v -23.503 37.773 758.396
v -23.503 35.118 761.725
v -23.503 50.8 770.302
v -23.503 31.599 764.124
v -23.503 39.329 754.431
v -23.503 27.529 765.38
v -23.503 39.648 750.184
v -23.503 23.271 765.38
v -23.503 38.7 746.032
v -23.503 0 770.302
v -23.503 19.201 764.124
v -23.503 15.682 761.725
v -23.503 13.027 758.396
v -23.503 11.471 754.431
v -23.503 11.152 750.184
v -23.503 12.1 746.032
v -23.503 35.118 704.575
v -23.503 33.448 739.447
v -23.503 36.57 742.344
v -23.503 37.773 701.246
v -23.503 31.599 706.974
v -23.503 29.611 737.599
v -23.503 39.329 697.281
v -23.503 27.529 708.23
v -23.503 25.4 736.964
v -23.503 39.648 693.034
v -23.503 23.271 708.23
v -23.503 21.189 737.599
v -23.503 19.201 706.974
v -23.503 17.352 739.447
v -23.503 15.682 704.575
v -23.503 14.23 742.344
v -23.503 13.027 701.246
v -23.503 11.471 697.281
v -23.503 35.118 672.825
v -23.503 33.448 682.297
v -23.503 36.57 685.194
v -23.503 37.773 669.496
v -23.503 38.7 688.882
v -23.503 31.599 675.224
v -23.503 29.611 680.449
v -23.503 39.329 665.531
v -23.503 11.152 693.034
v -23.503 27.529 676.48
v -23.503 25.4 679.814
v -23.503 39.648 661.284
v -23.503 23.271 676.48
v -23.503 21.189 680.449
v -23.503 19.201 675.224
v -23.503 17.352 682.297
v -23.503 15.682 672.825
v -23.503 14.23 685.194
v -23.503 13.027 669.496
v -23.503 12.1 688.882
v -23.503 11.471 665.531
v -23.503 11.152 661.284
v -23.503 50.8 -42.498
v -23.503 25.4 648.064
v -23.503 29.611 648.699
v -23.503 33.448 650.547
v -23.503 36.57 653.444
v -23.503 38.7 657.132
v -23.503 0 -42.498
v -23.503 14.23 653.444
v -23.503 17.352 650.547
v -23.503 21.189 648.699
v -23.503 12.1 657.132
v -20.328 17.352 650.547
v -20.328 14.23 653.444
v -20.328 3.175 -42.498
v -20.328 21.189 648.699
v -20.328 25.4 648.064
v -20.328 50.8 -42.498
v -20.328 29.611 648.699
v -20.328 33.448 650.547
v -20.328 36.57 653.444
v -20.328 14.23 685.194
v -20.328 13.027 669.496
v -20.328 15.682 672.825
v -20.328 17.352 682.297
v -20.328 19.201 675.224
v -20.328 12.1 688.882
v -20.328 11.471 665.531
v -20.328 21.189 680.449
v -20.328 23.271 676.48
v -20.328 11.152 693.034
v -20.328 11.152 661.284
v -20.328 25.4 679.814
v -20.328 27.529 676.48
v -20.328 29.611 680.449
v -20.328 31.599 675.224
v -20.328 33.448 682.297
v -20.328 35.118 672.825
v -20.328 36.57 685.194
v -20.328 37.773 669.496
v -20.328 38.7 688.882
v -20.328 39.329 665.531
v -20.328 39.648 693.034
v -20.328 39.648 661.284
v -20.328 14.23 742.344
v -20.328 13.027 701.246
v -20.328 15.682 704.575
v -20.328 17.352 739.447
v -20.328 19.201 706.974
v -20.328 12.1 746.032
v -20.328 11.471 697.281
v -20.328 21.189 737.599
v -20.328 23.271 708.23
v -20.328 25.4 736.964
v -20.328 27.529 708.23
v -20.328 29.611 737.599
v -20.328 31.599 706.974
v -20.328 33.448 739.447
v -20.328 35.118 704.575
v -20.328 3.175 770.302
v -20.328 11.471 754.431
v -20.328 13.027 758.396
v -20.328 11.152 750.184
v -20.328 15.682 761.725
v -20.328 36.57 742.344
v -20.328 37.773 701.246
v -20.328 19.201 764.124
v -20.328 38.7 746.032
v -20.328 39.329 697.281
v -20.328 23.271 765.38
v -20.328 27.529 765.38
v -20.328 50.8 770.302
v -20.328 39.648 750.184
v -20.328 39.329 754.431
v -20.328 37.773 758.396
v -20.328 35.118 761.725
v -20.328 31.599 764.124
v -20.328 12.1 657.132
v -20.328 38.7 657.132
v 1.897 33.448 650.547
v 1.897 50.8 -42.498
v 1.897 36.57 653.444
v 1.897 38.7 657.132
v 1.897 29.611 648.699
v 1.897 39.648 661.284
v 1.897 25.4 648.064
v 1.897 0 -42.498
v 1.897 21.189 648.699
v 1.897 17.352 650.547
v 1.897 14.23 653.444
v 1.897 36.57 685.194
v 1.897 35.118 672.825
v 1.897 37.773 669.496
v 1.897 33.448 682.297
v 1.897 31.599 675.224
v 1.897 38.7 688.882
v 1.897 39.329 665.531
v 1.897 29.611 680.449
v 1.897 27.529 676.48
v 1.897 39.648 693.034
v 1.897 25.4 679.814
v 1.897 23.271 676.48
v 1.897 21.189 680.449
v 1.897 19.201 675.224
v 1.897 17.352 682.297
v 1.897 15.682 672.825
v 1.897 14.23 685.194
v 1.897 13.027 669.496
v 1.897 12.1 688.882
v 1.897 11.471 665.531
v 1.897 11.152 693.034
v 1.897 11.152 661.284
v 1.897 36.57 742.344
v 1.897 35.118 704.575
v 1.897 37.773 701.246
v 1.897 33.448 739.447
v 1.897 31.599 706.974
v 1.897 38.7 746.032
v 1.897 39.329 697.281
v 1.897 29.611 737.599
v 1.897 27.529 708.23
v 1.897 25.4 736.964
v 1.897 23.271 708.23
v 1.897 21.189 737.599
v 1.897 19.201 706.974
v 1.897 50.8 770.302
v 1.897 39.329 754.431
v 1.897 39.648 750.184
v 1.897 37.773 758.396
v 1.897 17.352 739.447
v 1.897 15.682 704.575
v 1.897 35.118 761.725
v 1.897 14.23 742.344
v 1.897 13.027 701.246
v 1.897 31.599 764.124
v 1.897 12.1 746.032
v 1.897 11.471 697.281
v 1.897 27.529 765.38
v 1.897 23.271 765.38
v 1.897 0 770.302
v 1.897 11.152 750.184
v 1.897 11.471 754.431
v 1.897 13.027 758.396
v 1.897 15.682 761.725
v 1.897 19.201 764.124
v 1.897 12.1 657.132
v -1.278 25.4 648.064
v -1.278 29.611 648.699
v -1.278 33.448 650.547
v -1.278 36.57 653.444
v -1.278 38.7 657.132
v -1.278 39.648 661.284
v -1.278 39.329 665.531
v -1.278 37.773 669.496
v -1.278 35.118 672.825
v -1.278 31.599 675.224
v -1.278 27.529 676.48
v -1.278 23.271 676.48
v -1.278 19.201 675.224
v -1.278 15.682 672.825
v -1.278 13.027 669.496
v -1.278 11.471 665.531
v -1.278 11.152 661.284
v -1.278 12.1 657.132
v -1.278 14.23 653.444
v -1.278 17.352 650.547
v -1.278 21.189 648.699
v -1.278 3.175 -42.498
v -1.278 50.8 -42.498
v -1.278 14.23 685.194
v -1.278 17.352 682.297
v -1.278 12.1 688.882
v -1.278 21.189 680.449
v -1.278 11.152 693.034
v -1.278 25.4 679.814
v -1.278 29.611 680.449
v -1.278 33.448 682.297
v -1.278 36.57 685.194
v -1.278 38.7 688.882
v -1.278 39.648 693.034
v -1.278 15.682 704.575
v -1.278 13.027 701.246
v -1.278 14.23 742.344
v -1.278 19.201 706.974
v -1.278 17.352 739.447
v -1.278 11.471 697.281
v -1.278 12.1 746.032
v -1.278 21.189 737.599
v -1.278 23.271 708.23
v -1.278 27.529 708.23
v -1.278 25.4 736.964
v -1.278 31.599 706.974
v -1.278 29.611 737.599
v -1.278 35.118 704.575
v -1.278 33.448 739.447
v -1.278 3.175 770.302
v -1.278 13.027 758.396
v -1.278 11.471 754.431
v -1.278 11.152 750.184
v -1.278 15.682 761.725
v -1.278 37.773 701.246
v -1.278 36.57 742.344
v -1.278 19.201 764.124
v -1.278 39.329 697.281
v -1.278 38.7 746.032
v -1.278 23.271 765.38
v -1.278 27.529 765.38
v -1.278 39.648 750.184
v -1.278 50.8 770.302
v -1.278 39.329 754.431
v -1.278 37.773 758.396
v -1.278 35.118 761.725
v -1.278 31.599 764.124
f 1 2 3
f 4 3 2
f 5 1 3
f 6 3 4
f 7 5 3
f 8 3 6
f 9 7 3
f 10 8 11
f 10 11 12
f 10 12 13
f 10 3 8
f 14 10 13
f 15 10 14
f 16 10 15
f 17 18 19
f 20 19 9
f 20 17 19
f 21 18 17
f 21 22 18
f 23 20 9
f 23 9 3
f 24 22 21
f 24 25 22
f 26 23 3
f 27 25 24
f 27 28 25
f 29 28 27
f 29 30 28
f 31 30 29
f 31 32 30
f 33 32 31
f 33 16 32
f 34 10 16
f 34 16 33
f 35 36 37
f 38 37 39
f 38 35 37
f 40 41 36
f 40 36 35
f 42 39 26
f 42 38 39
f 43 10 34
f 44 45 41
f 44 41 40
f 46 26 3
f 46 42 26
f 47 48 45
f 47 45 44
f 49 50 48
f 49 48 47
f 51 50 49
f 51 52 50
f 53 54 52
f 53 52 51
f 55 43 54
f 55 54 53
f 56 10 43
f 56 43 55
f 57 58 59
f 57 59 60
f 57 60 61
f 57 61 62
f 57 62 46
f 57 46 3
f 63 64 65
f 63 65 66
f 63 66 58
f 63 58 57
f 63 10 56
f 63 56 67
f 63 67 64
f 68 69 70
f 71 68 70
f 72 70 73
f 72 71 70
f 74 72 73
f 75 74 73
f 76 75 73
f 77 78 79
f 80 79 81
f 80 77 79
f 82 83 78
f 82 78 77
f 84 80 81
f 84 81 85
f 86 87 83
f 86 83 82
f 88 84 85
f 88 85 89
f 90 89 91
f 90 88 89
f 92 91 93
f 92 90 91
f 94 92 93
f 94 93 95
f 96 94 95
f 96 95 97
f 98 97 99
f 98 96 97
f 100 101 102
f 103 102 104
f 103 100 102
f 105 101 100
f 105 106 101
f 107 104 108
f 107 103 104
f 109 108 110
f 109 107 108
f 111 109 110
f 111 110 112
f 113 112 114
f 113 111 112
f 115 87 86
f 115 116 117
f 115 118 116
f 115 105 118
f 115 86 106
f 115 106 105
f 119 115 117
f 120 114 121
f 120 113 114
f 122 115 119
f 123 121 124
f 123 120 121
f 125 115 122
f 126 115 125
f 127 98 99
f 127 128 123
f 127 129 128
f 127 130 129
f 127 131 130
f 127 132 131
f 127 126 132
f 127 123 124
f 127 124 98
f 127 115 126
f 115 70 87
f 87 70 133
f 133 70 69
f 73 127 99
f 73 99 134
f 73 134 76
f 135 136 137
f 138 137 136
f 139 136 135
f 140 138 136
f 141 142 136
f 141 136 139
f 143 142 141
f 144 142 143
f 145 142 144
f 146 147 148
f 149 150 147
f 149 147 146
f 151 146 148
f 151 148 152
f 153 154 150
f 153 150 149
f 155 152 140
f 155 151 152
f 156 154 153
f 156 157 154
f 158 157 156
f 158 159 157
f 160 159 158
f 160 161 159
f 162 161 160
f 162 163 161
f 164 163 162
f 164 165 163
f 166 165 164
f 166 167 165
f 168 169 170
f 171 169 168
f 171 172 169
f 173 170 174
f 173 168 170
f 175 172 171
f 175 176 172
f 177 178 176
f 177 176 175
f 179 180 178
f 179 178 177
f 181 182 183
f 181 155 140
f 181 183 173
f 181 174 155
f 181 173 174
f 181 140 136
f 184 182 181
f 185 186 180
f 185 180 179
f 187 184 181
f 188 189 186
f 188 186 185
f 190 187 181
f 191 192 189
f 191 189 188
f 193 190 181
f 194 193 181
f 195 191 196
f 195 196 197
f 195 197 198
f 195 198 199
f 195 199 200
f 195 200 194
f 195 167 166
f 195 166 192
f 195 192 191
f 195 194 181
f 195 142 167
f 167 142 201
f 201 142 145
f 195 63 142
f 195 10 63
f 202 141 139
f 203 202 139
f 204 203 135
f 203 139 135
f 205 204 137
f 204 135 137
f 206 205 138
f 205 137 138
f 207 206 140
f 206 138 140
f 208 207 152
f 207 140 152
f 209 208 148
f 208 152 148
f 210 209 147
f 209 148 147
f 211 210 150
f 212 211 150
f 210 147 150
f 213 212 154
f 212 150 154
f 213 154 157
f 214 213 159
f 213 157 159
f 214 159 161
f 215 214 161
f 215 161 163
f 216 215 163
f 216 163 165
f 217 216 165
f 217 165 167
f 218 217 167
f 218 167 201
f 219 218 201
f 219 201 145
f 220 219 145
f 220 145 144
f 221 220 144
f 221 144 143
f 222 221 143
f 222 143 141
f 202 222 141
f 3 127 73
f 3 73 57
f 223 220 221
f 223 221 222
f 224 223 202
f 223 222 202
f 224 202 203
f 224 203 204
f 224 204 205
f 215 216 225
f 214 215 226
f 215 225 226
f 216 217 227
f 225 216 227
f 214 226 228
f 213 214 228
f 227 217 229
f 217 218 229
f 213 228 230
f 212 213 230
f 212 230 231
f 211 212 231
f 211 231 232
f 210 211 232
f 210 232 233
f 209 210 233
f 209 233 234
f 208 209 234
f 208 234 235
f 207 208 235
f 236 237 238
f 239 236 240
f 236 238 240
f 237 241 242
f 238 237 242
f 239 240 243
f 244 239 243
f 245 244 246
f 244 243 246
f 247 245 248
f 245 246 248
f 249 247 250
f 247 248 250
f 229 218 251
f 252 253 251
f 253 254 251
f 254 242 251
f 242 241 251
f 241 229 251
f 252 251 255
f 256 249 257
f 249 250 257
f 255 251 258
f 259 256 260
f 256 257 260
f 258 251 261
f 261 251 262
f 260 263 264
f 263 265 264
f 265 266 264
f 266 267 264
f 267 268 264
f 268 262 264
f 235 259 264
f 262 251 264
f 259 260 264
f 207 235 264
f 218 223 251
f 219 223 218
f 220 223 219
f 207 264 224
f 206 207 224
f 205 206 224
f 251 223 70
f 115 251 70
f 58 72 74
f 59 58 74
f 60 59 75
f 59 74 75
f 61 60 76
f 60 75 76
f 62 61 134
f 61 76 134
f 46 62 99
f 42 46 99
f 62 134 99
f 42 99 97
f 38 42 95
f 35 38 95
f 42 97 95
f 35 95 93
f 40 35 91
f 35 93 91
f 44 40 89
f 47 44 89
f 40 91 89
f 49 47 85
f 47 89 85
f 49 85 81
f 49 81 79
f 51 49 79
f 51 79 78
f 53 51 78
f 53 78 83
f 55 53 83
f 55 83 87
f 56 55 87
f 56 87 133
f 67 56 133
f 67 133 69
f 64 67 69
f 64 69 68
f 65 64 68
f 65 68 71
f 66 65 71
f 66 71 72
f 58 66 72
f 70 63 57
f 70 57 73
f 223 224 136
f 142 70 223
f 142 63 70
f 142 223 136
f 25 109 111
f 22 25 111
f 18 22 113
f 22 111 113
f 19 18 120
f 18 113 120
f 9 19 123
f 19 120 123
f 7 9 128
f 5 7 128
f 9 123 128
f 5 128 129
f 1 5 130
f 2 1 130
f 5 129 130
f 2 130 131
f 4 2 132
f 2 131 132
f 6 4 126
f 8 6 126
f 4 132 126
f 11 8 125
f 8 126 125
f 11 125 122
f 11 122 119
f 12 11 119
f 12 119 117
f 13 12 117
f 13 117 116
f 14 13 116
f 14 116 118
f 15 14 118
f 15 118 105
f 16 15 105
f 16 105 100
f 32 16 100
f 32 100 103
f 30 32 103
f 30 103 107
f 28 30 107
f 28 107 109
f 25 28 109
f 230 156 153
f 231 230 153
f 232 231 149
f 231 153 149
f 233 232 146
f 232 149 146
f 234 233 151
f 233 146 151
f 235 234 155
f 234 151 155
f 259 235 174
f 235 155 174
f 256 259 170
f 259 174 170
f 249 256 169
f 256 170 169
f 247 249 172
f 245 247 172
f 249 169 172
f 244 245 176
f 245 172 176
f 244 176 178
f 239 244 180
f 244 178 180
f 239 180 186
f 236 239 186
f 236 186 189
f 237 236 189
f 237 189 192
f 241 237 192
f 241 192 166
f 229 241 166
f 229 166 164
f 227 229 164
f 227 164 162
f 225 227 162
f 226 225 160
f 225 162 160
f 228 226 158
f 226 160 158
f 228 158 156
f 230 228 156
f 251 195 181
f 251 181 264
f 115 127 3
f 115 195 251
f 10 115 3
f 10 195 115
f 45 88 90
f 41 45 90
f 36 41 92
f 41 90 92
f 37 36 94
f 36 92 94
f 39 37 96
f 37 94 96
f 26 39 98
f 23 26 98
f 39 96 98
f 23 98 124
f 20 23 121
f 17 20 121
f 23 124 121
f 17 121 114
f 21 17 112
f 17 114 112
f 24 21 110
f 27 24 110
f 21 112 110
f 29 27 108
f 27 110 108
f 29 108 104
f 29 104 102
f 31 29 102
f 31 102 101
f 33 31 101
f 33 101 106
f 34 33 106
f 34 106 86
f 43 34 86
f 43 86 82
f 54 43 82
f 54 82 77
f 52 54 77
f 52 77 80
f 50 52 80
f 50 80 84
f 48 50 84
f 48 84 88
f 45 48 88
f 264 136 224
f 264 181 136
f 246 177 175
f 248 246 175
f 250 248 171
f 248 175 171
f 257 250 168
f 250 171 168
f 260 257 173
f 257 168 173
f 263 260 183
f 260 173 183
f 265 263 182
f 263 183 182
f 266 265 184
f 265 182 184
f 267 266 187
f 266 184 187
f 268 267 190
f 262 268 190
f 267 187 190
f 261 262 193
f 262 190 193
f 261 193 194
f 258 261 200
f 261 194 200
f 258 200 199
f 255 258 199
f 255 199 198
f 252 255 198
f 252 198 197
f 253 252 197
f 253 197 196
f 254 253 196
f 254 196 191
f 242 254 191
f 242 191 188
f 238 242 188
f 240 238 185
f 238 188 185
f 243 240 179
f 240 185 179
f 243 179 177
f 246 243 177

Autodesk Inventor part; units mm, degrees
ref_plane "YZ Plane" through (0, 0, 0) normal (1, 0, 0) x (0, 1, 0)
ref_plane "XZ Plane" through (0, 0, 0) normal (0, 1, 0) x (-1, 0, 0)
ref_plane "XY Plane" through (0, 0, 0) normal (0, 0, 1) x (1, 0, 0)
sketch "Sketch1" plane through (0, 0, 0) normal (0, 1, 0) x (-1, 0, 0)
  line L0 (23.5034, -42.4981) -> (-1.8966, -42.4981)
  line L1 (-1.8966, -42.4981) -> (-1.8966, 770.3019)
  line L2 (-1.8966, 770.3019) -> (23.5034, 770.3019)
  line L3 (23.5034, 770.3019) -> (23.5034, -42.4981)
  line L4 (20.3284, -39.3231) -> (1.2784, -39.3231)
  line L5 (1.2784, -39.3231) -> (1.2784, 767.1269)
  line L6 (1.2784, 767.1269) -> (20.3284, 767.1269)
  line L7 (20.3284, 767.1269) -> (20.3284, -39.3231)
  point P0 (0, 0)
  dimension "d0" = 25.4
  dimension "d1" = 812.8
  dimension "d2" = 3.175
ref_plane "Work Plane3" through (0, 0, 0) normal (0, -1, 0) x (1, 0, 0)
sketch "Sketch2" plane through (0, 0, 0) normal (0, -1, 0) x (1, 0, 0)
  line L0 (-1.2784, -39.3231) -> (-20.3284, -39.3231) projected
  line L1 (-20.3284, -39.3231) -> (-20.3284, 767.1269) projected
  line L2 (-1.2784, -39.3231) -> (-20.3284, -39.3231)
  line L3 (-20.3284, -39.3231) -> (-20.3284, 767.1269)
  line L4 (-20.3284, 767.1269) -> (-1.2784, 767.1269)
  line L5 (-1.2784, 767.1269) -> (-1.2784, -39.3231)
  point P0 (0, 0)
extrude "Extrusion3" add sketch "Sketch2" against normal blind 3.175
extrude "Extrusion5" add sketch "Sketch1" along normal blind 50.8
sketch "Sketch4" plane through (-23.5034, 0, 770.3019) normal (0, 0, 1) x (1, 0, 0)
  line L0 (0, 50.8) -> (25.4, 50.8) projected
  line L1 (0, 50.8) -> (3.175, 50.8)
  line L2 (3.175, 50.8) -> (25.4, 50.8)
  line L3 (25.4, 50.8) -> (22.225, 50.8)
  line L4 (22.225, 3.175) -> (22.225, 50.8) projected
  line L5 (3.175, 50.8) -> (22.225, 50.8)
  line L6 (22.225, 50.8) -> (22.225, 3.175)
  line L7 (22.225, 3.175) -> (3.175, 3.175)
  line L8 (3.175, 3.175) -> (3.175, 50.8)
  point P0 (23.5034, 0)
  point P1 (22.225, 0)
  dimension "d13" = 3.175
  dimension "d14" = 3.175
extrude "Extrusion6" cut sketch "Sketch4" against normal blind 1016
sketch "Sketch5" plane through (1.8966, 0, 770.3019) normal (1, 0, 0) x (0, 0, -1)
  line L0 (0, 0) -> (19.05, 0)
  line L1 (19.05, 0) -> (19.05, 25.4)
  line L2 (19.05, 25.4) -> (0, 25.4)
  line L3 (0, 25.4) -> (0, 0)
  circle A0 centre (19.05, 25.4) radius 14.2875
  line L4 (19.05, 25.4) -> (76.2, 25.4)
  circle A1 centre (76.2, 25.4) radius 14.2875
  line L5 (76.2, 25.4) -> (107.95, 25.4)
  circle A2 centre (107.95, 25.4) radius 14.2875
  point P0 (770.3019, 0)
  dimension "d17" = 19.05
  dimension "d18" = 25.4
  dimension "d19" = 28.575
  dimension "d22" = 57.15
  dimension "d23" = 28.575
  dimension "d26" = 31.75
  dimension "d27" = 28.575
extrude "Extrusion10" cut sketch "Sketch5" against normal blind 50.8 contours A2 | A1 L5 L4 | L4 L5 A1 | A0 L2 L1 | L1 L4 A0 | A0 L4 L2
properties part number "36in Aluminum Channel"
